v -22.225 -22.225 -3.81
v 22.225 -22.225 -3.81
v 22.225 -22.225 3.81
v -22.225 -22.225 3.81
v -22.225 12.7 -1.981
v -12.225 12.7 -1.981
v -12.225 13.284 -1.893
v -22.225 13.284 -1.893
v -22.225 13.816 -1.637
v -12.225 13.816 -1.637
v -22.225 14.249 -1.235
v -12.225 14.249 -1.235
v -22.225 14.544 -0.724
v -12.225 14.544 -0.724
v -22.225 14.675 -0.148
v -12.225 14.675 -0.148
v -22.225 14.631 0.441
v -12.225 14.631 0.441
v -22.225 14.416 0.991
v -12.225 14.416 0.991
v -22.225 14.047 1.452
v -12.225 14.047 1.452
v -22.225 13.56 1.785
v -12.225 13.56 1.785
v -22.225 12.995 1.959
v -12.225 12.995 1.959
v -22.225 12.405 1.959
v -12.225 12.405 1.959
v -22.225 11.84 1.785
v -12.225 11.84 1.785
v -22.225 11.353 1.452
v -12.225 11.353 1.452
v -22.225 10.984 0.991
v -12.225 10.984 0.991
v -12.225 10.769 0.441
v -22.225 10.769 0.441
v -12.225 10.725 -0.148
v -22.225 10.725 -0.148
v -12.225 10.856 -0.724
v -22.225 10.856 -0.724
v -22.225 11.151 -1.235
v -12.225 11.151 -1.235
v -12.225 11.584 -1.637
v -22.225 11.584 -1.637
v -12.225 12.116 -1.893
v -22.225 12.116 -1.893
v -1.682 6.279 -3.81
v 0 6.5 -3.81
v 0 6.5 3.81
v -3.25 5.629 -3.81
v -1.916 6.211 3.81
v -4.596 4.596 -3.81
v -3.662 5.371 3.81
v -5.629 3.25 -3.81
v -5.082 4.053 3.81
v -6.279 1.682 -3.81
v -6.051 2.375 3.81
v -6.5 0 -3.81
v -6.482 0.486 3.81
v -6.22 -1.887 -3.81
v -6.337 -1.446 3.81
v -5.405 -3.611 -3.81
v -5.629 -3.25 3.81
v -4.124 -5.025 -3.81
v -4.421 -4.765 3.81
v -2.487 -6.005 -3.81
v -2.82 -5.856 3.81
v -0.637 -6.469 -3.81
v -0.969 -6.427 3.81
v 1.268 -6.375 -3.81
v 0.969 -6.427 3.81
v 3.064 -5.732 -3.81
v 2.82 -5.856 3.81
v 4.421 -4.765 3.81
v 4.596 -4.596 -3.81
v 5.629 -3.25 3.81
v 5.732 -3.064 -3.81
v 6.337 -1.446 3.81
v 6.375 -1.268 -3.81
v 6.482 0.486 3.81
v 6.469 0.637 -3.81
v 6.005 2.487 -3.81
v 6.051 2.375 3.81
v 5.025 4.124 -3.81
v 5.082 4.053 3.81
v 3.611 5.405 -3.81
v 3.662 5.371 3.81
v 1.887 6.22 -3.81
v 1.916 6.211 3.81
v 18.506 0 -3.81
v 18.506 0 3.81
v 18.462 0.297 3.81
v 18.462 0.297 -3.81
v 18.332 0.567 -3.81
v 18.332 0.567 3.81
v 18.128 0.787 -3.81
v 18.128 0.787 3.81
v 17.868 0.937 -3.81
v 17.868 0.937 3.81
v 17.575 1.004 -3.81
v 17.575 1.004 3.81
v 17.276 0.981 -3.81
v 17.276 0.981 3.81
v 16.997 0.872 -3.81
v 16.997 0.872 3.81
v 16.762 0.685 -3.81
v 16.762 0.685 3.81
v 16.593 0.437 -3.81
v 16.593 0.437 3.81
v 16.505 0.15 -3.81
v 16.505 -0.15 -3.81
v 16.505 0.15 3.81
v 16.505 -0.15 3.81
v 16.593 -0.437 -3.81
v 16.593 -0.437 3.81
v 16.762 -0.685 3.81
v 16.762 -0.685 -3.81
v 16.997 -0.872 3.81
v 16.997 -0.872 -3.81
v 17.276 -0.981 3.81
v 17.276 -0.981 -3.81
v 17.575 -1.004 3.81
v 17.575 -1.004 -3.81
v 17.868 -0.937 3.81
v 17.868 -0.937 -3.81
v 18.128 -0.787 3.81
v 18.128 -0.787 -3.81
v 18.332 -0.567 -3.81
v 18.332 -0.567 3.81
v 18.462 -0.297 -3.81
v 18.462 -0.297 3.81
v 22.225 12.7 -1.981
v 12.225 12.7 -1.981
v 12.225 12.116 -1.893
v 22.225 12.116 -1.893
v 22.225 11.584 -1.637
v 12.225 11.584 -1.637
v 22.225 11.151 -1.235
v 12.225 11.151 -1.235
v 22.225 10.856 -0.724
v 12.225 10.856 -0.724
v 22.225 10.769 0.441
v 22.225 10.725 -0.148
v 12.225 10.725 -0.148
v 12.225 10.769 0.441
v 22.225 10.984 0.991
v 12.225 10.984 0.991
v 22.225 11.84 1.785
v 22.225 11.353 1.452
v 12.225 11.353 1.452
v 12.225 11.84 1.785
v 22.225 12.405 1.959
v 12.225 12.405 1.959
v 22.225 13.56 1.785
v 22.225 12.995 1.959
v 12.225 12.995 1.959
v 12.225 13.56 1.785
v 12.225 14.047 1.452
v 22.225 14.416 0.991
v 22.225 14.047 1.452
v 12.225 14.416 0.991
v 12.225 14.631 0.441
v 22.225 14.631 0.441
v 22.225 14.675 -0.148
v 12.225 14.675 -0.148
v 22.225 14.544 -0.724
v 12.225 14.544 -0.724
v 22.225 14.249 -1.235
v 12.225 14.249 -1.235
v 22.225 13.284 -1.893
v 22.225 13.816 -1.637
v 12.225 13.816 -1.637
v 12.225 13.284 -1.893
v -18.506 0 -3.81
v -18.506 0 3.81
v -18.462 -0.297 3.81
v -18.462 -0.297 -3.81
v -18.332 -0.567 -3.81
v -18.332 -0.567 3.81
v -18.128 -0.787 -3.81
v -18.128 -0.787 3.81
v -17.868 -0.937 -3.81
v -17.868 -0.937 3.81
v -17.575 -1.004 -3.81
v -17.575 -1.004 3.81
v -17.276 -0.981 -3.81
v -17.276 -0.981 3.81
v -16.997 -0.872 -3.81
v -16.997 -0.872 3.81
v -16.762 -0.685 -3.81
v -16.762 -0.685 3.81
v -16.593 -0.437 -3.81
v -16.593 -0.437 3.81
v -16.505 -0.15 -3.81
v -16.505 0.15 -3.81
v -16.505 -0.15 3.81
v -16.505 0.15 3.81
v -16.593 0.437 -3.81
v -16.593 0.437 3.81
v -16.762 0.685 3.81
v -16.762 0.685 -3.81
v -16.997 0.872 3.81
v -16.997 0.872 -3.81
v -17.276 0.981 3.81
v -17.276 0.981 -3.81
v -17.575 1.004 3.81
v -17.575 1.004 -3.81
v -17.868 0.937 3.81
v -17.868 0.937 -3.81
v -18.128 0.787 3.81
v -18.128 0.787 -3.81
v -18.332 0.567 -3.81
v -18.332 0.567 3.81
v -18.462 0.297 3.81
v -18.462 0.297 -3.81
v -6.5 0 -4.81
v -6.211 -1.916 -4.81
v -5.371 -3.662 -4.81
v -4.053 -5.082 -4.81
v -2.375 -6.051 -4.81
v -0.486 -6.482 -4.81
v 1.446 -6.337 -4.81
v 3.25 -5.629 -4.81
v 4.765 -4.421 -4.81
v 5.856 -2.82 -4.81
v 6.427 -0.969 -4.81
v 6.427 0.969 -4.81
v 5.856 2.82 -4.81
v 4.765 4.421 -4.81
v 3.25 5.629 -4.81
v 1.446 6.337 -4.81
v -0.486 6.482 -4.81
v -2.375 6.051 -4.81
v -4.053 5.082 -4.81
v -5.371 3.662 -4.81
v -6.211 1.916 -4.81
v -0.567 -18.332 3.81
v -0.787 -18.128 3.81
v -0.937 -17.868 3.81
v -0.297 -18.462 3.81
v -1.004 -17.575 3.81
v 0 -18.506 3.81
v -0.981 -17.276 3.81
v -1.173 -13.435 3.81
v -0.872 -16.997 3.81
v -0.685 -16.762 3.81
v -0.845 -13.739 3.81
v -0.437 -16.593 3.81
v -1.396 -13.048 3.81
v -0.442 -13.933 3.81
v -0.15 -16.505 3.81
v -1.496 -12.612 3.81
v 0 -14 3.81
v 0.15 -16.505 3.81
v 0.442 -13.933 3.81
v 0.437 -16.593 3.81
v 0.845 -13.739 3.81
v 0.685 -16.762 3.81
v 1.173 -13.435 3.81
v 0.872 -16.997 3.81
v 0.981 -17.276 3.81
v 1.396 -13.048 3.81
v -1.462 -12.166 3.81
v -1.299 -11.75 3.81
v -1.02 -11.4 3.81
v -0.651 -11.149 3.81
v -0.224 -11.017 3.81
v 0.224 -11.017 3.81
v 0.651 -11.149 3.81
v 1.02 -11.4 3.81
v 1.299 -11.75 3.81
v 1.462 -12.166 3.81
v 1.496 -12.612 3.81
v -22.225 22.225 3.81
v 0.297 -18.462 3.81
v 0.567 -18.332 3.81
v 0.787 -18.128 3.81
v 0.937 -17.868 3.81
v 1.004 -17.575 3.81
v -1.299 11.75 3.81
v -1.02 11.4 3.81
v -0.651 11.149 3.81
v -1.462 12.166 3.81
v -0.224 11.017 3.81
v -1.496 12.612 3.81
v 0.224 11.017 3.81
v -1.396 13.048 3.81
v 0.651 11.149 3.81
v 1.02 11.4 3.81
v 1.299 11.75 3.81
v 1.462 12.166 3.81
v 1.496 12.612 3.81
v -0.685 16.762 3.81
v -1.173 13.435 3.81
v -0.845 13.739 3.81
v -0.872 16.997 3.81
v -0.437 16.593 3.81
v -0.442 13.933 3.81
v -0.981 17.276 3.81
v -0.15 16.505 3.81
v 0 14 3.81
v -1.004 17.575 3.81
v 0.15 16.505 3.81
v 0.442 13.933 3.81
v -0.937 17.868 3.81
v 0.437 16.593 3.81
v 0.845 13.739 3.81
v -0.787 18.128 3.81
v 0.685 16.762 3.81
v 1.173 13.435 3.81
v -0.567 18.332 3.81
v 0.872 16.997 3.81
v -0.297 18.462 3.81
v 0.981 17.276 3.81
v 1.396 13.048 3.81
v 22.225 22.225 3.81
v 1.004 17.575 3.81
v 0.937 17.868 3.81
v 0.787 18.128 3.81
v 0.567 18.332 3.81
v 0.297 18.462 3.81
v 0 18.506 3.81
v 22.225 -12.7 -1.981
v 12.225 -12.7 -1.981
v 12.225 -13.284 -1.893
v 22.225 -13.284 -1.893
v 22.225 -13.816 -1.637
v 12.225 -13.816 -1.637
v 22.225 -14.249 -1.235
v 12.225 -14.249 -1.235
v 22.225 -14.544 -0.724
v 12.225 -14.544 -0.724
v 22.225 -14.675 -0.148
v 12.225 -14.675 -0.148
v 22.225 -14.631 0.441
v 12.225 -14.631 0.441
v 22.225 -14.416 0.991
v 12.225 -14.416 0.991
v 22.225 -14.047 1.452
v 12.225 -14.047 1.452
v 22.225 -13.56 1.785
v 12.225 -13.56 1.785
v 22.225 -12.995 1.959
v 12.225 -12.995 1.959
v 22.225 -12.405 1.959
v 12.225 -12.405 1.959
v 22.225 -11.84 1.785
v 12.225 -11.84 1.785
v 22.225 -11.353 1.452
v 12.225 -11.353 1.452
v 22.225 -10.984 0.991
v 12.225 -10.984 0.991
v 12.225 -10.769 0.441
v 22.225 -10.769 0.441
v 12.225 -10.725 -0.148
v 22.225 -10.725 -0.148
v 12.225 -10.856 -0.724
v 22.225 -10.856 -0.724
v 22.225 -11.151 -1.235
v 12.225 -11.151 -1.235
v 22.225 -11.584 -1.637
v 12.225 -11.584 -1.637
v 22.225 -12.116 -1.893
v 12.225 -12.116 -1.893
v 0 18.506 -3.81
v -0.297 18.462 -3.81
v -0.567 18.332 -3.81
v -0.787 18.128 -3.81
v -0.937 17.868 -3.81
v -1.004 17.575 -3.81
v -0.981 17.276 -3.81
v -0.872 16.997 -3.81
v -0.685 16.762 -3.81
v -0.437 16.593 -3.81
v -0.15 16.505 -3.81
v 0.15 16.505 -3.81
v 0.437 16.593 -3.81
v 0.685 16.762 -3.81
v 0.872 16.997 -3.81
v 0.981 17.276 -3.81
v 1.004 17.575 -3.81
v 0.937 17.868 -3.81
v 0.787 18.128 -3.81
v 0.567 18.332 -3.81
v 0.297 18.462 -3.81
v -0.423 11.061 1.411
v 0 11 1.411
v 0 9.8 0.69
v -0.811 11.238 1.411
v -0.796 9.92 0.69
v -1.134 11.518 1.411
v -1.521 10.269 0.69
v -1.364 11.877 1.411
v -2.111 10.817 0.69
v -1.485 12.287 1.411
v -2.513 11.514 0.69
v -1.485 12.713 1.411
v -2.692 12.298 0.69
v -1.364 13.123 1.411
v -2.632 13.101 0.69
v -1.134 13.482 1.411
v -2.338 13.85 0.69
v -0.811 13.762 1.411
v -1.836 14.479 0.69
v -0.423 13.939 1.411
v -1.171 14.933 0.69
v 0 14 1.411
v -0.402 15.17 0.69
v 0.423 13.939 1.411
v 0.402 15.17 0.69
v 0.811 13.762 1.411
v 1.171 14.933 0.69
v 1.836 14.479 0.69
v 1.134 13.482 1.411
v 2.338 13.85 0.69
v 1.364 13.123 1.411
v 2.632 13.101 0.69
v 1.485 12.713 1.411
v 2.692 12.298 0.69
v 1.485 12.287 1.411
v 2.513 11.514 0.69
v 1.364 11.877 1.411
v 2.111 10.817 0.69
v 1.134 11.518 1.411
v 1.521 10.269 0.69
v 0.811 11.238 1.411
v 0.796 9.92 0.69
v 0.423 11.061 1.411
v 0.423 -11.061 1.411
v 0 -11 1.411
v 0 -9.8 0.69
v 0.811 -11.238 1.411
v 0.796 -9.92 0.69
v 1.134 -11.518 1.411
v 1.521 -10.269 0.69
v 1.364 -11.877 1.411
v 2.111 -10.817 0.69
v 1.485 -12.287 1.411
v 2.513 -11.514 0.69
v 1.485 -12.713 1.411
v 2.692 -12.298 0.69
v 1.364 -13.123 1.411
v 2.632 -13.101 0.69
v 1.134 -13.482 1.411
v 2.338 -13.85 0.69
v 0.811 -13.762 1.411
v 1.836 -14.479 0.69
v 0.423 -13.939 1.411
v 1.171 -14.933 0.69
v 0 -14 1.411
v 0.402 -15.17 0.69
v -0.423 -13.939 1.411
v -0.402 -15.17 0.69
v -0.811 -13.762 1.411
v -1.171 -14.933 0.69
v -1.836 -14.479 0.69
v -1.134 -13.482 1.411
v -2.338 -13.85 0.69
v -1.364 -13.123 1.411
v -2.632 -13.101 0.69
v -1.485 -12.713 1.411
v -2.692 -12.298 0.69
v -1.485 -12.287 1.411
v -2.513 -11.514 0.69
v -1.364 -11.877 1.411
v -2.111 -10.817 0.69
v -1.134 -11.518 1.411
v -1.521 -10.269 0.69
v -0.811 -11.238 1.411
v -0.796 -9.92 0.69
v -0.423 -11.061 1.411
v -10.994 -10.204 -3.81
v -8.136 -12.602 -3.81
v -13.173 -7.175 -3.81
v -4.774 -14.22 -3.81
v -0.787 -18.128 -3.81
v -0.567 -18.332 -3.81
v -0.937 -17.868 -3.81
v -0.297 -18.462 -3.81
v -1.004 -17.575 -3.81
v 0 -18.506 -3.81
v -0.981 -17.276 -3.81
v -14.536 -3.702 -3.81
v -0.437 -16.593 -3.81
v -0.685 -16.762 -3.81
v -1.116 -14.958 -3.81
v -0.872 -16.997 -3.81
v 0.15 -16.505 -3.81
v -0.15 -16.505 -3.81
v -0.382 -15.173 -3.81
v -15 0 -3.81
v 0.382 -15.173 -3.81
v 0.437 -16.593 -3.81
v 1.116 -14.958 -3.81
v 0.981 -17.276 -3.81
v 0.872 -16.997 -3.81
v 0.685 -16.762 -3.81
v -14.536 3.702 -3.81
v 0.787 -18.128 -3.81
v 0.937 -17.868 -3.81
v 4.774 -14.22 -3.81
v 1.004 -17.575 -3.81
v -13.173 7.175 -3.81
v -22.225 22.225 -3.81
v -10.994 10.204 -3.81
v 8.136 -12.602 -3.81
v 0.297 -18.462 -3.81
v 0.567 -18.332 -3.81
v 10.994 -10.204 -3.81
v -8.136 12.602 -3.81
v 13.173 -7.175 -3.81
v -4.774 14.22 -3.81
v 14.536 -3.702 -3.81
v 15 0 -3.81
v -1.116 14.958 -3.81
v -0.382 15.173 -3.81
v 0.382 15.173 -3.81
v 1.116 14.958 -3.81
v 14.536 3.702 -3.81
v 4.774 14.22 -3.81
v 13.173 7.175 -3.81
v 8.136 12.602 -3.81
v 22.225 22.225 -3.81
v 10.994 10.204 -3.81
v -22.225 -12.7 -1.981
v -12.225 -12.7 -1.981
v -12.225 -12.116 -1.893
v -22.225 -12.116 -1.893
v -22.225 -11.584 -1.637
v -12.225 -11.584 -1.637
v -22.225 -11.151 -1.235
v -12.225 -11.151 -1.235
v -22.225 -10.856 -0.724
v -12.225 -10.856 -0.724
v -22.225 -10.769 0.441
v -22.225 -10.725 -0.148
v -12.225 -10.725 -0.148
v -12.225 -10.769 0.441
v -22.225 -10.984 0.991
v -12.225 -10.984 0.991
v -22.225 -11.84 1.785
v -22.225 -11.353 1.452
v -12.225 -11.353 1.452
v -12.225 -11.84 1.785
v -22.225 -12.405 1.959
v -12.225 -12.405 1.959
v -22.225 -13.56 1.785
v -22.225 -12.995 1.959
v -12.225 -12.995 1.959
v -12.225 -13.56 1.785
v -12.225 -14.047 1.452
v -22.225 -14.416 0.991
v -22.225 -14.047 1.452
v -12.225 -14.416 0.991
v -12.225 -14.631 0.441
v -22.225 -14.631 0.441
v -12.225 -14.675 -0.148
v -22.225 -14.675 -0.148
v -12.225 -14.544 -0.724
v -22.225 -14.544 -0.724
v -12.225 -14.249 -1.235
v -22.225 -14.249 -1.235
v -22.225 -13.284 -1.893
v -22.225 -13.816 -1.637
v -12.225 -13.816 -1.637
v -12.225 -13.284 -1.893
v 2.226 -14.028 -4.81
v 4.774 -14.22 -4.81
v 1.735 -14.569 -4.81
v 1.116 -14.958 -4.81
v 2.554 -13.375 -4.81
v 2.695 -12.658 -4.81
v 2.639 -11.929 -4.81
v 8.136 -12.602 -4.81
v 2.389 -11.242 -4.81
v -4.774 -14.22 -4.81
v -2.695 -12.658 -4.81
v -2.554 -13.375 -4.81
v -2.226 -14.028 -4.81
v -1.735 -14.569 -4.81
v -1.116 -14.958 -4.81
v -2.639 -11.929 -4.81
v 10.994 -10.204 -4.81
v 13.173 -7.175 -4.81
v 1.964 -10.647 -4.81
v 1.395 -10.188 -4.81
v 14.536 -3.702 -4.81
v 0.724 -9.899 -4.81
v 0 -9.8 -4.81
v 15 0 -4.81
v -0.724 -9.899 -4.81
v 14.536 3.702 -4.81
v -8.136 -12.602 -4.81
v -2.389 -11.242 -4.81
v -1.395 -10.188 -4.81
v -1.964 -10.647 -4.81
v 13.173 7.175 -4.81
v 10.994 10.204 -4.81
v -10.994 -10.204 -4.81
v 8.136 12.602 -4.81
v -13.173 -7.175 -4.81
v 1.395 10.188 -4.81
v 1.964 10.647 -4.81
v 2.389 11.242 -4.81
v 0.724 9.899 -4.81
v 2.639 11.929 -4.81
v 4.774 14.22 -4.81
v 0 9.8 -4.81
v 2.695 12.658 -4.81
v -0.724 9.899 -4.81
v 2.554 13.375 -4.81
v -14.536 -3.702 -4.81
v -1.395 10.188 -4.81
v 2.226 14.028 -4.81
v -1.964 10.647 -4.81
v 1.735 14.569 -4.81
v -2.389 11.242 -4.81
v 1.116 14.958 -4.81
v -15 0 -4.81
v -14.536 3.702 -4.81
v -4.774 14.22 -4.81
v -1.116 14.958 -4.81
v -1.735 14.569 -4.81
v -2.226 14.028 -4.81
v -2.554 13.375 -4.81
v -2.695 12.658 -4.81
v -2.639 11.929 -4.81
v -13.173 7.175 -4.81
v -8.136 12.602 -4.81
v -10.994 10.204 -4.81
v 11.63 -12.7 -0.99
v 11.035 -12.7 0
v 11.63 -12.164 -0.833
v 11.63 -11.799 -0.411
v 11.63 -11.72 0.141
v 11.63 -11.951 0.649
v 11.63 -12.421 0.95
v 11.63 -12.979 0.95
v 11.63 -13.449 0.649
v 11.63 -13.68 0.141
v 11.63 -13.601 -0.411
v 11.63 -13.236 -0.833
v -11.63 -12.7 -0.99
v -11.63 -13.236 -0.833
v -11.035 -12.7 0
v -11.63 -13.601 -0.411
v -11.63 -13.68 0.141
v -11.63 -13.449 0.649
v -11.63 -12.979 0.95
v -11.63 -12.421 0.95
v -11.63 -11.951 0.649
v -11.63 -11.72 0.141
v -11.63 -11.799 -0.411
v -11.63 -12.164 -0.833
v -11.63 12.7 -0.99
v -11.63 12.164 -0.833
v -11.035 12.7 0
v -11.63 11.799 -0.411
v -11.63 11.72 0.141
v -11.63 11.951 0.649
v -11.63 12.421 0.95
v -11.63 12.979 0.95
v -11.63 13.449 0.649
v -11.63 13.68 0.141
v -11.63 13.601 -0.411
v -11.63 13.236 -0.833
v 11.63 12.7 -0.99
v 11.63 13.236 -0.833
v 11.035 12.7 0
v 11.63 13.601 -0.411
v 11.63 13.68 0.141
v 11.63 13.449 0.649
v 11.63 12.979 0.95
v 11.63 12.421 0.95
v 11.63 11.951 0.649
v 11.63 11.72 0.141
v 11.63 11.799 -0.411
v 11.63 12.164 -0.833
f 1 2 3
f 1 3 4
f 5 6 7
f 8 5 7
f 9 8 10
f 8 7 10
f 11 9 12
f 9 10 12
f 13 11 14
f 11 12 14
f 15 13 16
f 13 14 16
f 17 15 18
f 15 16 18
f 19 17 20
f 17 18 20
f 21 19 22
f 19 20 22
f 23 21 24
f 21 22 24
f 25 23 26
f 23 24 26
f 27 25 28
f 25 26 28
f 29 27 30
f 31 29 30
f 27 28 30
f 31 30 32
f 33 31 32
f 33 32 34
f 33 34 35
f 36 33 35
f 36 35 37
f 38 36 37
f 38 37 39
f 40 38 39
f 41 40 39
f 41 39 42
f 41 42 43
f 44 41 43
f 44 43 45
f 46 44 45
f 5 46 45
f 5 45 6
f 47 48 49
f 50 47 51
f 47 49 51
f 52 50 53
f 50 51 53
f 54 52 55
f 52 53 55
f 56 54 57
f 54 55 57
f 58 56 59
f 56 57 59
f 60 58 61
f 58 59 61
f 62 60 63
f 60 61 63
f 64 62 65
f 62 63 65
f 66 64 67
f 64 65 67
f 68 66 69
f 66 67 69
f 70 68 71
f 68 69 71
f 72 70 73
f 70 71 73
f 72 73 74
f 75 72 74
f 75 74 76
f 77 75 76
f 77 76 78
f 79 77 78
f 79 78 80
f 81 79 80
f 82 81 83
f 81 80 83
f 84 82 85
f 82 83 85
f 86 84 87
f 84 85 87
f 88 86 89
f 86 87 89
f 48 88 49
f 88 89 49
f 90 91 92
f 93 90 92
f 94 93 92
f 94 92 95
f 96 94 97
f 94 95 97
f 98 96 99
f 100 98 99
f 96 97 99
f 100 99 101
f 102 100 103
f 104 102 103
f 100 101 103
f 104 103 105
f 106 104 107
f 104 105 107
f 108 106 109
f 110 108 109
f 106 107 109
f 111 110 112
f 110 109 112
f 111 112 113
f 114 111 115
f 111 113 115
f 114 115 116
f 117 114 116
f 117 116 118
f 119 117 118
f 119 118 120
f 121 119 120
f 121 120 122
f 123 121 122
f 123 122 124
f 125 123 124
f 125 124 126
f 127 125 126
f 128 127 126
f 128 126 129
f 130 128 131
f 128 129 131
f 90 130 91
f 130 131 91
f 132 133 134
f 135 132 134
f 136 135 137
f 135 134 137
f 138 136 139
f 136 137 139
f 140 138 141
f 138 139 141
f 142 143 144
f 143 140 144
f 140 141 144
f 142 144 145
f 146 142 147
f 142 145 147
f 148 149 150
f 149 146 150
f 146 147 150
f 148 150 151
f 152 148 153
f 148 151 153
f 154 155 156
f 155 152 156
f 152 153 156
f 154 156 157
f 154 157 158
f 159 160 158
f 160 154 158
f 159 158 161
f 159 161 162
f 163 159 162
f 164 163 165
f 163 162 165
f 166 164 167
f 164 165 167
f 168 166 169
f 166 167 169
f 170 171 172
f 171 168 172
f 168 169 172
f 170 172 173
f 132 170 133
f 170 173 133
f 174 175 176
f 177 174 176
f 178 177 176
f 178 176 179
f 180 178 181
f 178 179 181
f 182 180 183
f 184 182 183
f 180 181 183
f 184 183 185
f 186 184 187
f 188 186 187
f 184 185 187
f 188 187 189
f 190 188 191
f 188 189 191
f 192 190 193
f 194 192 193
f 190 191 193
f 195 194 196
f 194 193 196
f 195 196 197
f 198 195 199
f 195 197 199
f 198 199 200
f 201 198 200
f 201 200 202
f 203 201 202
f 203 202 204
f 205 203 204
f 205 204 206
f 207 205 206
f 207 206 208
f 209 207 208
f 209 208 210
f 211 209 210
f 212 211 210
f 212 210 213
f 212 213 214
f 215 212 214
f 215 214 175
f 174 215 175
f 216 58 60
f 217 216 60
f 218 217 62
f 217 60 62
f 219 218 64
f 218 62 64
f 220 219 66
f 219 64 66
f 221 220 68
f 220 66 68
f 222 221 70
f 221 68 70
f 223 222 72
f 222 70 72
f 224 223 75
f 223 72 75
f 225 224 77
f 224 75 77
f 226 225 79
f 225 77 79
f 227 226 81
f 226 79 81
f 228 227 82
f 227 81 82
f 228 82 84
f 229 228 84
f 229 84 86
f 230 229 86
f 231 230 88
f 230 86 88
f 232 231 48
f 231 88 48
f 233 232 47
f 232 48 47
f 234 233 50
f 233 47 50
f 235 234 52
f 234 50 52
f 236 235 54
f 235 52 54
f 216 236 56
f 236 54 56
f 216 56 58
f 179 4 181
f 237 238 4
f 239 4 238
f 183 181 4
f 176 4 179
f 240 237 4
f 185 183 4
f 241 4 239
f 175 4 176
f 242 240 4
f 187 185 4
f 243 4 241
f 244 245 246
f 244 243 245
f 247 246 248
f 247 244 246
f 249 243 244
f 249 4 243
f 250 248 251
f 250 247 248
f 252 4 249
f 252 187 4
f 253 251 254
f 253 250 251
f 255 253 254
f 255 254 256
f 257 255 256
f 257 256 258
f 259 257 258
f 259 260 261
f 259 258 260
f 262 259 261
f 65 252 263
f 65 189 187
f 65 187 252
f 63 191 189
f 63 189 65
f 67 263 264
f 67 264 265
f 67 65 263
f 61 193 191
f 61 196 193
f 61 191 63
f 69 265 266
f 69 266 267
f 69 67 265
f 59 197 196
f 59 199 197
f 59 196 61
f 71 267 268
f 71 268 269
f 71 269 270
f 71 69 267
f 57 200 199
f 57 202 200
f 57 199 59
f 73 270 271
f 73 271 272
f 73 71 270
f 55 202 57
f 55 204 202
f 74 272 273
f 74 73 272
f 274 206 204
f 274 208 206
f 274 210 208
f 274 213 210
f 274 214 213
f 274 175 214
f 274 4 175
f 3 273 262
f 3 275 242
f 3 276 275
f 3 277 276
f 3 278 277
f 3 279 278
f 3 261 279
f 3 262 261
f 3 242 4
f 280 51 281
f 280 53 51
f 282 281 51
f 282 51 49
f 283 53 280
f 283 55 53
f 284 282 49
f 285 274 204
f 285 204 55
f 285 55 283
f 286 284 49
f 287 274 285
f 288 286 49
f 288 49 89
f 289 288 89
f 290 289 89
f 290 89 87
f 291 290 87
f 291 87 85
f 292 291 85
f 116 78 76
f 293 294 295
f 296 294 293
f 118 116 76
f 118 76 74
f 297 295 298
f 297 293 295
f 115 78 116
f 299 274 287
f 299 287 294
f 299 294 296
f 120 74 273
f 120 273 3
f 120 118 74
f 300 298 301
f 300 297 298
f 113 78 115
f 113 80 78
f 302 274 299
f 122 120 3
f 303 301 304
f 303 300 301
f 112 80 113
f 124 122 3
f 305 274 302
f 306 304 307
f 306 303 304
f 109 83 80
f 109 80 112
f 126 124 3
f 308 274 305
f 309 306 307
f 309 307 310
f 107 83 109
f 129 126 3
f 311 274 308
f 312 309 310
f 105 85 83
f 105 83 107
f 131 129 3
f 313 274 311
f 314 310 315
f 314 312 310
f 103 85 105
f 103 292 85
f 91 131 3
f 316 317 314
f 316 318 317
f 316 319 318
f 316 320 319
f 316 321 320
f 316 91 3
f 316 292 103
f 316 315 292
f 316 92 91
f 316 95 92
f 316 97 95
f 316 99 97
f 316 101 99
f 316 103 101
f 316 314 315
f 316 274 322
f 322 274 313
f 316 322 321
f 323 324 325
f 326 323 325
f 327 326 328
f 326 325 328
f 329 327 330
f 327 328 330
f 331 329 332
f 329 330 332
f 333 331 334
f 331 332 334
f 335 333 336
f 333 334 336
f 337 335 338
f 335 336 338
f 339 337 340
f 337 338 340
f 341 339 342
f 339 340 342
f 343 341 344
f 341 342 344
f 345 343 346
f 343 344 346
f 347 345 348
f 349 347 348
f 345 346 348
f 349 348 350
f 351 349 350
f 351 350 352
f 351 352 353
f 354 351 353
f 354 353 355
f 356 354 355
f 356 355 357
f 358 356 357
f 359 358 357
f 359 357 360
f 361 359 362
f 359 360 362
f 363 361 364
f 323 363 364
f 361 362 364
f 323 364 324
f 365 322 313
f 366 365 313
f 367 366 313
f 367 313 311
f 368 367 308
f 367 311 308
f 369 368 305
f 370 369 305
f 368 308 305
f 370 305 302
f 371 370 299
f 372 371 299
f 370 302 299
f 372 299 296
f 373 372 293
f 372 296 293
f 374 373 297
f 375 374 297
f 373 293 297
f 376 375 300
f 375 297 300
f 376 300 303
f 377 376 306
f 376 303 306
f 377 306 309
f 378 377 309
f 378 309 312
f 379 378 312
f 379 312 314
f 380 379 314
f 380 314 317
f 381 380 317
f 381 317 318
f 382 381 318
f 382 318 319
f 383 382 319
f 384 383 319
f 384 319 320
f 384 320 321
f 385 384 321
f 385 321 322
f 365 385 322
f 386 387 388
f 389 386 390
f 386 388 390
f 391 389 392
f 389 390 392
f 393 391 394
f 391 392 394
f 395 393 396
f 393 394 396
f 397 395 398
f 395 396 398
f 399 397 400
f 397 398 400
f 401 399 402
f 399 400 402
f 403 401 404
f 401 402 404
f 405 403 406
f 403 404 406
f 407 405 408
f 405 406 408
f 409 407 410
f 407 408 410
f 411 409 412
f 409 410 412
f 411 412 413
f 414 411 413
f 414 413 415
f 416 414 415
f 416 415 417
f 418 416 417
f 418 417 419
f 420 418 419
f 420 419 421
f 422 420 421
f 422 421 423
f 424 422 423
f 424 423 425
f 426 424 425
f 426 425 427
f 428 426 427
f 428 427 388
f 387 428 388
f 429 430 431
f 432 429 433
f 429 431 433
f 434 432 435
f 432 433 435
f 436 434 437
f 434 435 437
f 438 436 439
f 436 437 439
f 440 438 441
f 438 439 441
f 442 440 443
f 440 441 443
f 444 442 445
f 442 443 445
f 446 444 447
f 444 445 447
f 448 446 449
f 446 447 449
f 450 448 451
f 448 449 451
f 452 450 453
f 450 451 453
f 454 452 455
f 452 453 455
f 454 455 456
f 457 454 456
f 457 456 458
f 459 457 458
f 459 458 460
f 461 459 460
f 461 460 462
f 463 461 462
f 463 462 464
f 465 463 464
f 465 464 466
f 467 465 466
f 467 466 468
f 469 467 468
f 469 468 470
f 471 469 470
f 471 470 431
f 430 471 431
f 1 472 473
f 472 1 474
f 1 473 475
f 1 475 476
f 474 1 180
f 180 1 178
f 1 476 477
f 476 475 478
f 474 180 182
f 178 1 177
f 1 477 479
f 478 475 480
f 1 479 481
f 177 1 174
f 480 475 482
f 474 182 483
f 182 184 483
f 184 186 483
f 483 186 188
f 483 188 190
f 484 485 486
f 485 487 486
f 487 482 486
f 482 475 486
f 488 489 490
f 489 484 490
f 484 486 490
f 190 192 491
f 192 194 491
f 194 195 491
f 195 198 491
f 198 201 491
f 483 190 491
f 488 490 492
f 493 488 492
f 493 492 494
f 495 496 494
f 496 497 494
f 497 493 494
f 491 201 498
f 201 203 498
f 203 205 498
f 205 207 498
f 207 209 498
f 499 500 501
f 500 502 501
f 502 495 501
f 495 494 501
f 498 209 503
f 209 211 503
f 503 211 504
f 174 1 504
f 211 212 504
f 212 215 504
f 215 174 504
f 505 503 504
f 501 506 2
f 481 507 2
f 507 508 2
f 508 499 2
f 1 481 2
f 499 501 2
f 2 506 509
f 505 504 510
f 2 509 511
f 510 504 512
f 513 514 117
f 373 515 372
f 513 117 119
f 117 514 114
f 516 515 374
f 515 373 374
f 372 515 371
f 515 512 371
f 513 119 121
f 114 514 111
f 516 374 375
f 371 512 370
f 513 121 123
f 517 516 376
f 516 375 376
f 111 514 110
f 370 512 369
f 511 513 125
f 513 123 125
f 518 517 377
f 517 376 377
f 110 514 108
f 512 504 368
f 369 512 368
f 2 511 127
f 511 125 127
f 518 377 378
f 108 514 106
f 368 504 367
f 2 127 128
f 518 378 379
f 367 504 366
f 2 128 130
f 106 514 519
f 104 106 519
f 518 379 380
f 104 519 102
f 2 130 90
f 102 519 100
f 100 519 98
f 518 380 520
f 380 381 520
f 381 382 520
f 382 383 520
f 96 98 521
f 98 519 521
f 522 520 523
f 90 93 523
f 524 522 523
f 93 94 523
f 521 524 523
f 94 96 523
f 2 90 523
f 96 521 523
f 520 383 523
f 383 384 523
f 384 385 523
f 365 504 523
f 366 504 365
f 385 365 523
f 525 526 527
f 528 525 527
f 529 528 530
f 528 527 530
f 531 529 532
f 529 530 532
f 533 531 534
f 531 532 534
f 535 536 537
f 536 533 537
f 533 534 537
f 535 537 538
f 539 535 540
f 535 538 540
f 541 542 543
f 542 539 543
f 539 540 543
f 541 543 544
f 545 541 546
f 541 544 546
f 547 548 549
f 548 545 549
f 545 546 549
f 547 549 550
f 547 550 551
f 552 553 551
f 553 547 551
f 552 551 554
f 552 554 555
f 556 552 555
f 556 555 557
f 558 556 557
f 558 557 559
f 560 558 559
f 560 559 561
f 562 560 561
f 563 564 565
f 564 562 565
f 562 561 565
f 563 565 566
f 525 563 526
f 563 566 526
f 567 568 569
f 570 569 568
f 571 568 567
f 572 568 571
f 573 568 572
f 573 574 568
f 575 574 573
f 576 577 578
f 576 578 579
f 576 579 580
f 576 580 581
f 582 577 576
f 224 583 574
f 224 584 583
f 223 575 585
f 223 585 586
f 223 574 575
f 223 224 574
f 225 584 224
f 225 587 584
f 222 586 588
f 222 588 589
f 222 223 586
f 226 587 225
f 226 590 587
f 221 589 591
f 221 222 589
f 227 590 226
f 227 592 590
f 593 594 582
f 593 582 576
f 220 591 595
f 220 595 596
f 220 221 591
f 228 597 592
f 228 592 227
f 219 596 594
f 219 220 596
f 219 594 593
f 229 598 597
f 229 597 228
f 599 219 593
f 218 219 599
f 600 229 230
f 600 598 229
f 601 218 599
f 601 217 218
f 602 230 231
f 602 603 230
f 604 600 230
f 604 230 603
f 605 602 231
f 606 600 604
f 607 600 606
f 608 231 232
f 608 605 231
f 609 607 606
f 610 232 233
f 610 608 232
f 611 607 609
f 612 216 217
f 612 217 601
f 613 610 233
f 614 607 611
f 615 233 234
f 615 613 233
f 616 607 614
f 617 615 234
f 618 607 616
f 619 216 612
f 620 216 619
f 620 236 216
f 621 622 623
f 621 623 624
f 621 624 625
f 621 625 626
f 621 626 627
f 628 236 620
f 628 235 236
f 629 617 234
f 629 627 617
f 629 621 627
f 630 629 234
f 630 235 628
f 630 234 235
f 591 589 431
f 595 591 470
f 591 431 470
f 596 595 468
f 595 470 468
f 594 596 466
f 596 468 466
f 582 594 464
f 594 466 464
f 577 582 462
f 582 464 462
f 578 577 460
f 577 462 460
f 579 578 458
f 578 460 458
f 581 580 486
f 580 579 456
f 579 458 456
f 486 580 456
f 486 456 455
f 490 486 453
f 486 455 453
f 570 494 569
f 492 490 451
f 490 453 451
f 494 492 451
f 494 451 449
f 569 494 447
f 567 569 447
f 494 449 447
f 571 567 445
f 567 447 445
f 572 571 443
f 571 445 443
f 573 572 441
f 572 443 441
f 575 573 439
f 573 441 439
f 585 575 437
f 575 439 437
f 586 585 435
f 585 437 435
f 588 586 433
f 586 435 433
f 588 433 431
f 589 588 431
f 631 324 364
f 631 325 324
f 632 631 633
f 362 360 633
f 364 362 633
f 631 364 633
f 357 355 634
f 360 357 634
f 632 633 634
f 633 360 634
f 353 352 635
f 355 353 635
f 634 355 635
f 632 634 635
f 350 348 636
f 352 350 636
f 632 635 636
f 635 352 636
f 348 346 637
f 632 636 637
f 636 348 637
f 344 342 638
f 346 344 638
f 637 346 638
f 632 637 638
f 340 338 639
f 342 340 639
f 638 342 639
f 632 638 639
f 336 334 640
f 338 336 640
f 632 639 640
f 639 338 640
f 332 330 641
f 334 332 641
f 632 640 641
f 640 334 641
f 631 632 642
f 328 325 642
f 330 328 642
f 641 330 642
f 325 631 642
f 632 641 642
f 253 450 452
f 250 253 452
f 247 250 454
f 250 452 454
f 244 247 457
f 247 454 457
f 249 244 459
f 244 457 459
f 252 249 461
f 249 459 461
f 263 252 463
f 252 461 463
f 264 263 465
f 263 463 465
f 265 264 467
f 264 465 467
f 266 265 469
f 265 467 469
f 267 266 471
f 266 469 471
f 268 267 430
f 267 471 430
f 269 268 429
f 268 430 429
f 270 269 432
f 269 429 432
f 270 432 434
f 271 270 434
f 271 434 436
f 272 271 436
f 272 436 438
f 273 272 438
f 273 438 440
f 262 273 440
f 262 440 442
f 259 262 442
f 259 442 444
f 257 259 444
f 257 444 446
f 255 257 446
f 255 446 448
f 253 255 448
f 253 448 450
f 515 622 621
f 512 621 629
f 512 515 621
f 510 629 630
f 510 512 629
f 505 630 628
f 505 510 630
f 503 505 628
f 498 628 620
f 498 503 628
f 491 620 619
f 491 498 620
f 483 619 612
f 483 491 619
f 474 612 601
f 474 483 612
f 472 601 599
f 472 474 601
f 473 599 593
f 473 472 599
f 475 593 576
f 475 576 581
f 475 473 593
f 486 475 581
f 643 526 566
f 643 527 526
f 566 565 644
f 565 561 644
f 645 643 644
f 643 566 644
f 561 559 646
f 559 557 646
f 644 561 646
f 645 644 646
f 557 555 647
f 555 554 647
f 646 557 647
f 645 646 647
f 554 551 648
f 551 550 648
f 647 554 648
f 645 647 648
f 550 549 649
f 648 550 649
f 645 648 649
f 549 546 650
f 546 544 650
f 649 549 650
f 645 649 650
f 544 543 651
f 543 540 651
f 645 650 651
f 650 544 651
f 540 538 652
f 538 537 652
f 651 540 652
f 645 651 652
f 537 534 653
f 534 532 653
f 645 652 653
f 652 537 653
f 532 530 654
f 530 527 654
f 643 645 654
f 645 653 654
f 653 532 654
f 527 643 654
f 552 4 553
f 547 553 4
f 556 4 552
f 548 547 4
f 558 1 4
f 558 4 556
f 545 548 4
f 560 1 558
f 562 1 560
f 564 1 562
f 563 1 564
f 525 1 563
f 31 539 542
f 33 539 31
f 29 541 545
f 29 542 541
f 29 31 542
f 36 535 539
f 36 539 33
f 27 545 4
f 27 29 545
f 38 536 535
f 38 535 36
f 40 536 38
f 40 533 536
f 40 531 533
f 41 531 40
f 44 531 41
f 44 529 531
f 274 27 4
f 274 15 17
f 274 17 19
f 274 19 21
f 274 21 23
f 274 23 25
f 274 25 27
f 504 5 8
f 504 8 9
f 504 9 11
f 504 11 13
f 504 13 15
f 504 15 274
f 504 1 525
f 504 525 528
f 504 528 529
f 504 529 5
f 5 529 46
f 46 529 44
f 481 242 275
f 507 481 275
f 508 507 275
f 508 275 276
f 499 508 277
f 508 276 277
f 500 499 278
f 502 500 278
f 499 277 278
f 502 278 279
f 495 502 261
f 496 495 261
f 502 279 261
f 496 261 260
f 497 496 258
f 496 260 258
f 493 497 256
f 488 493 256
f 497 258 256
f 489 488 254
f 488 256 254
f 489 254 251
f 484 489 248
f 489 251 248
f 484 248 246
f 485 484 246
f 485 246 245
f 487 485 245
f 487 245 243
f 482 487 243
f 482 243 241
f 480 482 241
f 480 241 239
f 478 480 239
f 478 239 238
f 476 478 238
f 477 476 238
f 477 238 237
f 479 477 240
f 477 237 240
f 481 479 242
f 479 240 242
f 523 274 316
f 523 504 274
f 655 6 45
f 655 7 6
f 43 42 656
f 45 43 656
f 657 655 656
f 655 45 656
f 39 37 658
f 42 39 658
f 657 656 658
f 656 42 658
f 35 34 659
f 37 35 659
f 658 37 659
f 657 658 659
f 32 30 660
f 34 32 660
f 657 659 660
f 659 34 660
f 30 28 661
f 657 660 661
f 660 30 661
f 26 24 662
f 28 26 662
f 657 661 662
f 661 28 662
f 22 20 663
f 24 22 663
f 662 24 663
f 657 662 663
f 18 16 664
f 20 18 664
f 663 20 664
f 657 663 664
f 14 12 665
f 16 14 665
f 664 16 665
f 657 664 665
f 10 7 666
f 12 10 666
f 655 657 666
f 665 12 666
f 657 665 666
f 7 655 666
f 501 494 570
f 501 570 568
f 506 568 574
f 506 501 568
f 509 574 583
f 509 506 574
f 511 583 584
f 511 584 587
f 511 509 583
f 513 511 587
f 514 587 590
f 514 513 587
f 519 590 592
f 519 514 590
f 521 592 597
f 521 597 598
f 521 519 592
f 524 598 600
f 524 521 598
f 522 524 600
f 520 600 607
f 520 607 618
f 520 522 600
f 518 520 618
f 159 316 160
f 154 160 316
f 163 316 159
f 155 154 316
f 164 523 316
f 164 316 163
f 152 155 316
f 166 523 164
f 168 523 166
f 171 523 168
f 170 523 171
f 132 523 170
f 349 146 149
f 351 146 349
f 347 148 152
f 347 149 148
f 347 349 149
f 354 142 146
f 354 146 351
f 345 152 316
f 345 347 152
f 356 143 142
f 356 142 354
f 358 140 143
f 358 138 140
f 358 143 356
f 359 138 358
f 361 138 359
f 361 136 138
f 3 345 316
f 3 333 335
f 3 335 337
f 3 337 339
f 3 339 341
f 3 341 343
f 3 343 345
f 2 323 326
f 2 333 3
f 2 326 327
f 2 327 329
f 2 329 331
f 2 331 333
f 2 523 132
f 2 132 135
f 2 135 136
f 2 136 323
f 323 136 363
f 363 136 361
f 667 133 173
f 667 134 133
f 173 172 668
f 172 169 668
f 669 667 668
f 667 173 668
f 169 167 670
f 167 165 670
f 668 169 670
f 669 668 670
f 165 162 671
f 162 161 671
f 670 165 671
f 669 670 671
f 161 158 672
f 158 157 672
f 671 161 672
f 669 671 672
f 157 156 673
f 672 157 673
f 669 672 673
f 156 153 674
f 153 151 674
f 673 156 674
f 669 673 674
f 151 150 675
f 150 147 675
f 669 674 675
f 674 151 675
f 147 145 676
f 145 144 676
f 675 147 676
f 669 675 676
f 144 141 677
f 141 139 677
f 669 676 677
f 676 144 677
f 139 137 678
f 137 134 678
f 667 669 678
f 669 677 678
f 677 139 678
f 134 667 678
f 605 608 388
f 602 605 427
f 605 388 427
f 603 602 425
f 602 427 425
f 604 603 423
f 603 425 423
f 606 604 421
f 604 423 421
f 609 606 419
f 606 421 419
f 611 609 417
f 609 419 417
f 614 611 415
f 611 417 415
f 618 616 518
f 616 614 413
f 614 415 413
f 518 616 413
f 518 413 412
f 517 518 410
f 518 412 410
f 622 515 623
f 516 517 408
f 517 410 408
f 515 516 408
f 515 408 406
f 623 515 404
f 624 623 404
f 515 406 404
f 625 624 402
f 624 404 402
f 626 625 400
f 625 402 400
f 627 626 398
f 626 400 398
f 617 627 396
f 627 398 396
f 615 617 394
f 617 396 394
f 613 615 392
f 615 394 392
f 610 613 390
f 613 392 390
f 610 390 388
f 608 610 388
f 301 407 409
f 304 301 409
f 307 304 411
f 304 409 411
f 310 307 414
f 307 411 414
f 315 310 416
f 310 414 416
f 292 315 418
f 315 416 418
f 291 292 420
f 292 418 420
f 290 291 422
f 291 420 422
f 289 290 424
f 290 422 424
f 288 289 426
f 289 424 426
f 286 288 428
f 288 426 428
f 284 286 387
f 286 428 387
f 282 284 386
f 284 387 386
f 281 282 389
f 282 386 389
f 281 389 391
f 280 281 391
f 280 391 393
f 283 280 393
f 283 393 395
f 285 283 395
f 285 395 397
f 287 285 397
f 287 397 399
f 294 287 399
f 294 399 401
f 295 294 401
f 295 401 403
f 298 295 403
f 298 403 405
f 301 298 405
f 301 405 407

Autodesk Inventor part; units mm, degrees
ref_plane "YZ Plane" through (0, 0, 0) normal (1, 0, 0) x (0, 1, 0)
ref_plane "XZ Plane" through (0, 0, 0) normal (0, 1, 0) x (-1, 0, 0)
ref_plane "XY Plane" through (0, 0, 0) normal (0, 0, 1) x (1, 0, 0)
sketch "Sketch1" plane through (0, 0, 0) normal (0, 0, 1) x (1, 0, 0)
  line L0 (-22.225, 22.225) -> (22.225, 22.225)
  line L1 (22.225, 22.225) -> (22.225, -22.225)
  line L2 (22.225, -22.225) -> (-22.225, -22.225)
  line L3 (-22.225, -22.225) -> (-22.225, 22.225)
  line L4 (0, 0) -> (0, 22.225) construction
  line L5 (0, 0) -> (0, -22.225) construction
  line L6 (0, 0) -> (22.225, 0) construction
  line L7 (0, 0) -> (-22.225, 0) construction
  dimension "d0" = 44.45
  dimension "d1" = 44.45
extrude "Extrusion1" add sketch "Sketch1" along normal mid plane 7.62
sketch "Sketch2" plane through (0, 0, -3.81) normal (0, 0, -1) x (-1, 0, 0)
  point P0 (0, 0)
hole "Hole1" at (0, 0, -3.81) direction (0, 0, 1) diameter 13 end through all
sketch "Sketch7" plane through (0, 0, -3.81) normal (0, 0, -1) x (-1, 0, 0)
  circle A0 centre (0, 0) radius 6.5 projected
  circle A1 centre (0, 0) radius 15
  dimension "d49" = 30
extrude "Extrusion2" add sketch "Sketch7" along normal blind 1
sketch "Sketch8" plane through (0, 0, 3.81) normal (0, 0, 1) x (1, 0, 0)
  circle A0 centre (0, 0) radius 6.5 projected
  line L0 (22.225, -22.225) -> (-22.225, -22.225) projected
  line L1 (0, 0) -> (26.1346, 0) construction
  line L2 (0, 0) -> (0, -12.5) construction
  dimension "d52" = 90
  dimension "d53" = 12.5
hole "Hole6" at (0, -12.5, 3.81) direction (0, 0, -1) diameter 3 end through all
sketch "Sketch9" plane through (0, 0, -4.81) normal (0, 0, -1) x (-1, 0, 0)
  arc A0 (-7.7164, -9.8339) -> (-9.8339, -7.7164) centre (0, -12.5) ccw projected
  point P0 (0, -12.5)
hole "Hole7" at (0, -12.5, -4.81) direction (0, 0, 1) diameter 5.4 depth 5.5 tip angle 118
pattern_circular "Circular Pattern2" count 2 over 360 about axis through (0, 0, 59.512) along (0, 0, -1) of "Hole6", "Hole7"
sketch "Sketch10" plane through (0, 0, -3.81) normal (0, 0, -1) x (-1, 0, 0)
  arc A0 (1.1164, -14.9584) -> (1.1164, 14.9584) centre (0, 0) ccw projected
  point P0 (0, 17.5)
  dimension "d71" = 17.5
hole "Hole8" at (0, 17.5, -3.81) direction (0, 0, 1) diameter 2.013 end through all thread size "M2.5x0.45" class "6H" standard "ANSI Metric M Profile"
pattern_circular "Circular Pattern3" count 4 over 360 about axis through (0, 0, 59.512) along (0, 0, -1) of "Hole8"
sketch "Sketch11" plane through (22.225, -22.225, 3.81) normal (1, 0, 0) x (0, 0, -1)
  line L0 (0, 44.45) -> (0, 0) projected
  line L1 (0, 0) -> (7.62, 0) projected
  line L2 (7.62, 0) -> (7.62, 44.45) projected
  line L3 (0, 44.45) -> (7.62, 44.45) projected
  line L4 (3.81, 0) -> (3.81, 44.45) construction
  line L5 (7.62, 22.225) -> (0, 22.225) construction
  point P0 (3.81, 9.525)
  dimension "d82" = 12.7
hole "Hole9" at (22.225, -12.7, 0) direction (-1, 0, 0) diameter 3.962 depth 10 tip angle 118 thread size "10-32 UNF" class "2B" standard "ANSI Unified Screw Threads"
mirror "Mirror7" about plane through (0, 0, 0) normal (0, 1, 0) of "Hole9"
mirror "Mirror8" about plane through (0, 0, 0) normal (1, 0, 0) of "Hole9", "Mirror7"
properties part number "BB1-BackPlate" material "Steel, Mild"
